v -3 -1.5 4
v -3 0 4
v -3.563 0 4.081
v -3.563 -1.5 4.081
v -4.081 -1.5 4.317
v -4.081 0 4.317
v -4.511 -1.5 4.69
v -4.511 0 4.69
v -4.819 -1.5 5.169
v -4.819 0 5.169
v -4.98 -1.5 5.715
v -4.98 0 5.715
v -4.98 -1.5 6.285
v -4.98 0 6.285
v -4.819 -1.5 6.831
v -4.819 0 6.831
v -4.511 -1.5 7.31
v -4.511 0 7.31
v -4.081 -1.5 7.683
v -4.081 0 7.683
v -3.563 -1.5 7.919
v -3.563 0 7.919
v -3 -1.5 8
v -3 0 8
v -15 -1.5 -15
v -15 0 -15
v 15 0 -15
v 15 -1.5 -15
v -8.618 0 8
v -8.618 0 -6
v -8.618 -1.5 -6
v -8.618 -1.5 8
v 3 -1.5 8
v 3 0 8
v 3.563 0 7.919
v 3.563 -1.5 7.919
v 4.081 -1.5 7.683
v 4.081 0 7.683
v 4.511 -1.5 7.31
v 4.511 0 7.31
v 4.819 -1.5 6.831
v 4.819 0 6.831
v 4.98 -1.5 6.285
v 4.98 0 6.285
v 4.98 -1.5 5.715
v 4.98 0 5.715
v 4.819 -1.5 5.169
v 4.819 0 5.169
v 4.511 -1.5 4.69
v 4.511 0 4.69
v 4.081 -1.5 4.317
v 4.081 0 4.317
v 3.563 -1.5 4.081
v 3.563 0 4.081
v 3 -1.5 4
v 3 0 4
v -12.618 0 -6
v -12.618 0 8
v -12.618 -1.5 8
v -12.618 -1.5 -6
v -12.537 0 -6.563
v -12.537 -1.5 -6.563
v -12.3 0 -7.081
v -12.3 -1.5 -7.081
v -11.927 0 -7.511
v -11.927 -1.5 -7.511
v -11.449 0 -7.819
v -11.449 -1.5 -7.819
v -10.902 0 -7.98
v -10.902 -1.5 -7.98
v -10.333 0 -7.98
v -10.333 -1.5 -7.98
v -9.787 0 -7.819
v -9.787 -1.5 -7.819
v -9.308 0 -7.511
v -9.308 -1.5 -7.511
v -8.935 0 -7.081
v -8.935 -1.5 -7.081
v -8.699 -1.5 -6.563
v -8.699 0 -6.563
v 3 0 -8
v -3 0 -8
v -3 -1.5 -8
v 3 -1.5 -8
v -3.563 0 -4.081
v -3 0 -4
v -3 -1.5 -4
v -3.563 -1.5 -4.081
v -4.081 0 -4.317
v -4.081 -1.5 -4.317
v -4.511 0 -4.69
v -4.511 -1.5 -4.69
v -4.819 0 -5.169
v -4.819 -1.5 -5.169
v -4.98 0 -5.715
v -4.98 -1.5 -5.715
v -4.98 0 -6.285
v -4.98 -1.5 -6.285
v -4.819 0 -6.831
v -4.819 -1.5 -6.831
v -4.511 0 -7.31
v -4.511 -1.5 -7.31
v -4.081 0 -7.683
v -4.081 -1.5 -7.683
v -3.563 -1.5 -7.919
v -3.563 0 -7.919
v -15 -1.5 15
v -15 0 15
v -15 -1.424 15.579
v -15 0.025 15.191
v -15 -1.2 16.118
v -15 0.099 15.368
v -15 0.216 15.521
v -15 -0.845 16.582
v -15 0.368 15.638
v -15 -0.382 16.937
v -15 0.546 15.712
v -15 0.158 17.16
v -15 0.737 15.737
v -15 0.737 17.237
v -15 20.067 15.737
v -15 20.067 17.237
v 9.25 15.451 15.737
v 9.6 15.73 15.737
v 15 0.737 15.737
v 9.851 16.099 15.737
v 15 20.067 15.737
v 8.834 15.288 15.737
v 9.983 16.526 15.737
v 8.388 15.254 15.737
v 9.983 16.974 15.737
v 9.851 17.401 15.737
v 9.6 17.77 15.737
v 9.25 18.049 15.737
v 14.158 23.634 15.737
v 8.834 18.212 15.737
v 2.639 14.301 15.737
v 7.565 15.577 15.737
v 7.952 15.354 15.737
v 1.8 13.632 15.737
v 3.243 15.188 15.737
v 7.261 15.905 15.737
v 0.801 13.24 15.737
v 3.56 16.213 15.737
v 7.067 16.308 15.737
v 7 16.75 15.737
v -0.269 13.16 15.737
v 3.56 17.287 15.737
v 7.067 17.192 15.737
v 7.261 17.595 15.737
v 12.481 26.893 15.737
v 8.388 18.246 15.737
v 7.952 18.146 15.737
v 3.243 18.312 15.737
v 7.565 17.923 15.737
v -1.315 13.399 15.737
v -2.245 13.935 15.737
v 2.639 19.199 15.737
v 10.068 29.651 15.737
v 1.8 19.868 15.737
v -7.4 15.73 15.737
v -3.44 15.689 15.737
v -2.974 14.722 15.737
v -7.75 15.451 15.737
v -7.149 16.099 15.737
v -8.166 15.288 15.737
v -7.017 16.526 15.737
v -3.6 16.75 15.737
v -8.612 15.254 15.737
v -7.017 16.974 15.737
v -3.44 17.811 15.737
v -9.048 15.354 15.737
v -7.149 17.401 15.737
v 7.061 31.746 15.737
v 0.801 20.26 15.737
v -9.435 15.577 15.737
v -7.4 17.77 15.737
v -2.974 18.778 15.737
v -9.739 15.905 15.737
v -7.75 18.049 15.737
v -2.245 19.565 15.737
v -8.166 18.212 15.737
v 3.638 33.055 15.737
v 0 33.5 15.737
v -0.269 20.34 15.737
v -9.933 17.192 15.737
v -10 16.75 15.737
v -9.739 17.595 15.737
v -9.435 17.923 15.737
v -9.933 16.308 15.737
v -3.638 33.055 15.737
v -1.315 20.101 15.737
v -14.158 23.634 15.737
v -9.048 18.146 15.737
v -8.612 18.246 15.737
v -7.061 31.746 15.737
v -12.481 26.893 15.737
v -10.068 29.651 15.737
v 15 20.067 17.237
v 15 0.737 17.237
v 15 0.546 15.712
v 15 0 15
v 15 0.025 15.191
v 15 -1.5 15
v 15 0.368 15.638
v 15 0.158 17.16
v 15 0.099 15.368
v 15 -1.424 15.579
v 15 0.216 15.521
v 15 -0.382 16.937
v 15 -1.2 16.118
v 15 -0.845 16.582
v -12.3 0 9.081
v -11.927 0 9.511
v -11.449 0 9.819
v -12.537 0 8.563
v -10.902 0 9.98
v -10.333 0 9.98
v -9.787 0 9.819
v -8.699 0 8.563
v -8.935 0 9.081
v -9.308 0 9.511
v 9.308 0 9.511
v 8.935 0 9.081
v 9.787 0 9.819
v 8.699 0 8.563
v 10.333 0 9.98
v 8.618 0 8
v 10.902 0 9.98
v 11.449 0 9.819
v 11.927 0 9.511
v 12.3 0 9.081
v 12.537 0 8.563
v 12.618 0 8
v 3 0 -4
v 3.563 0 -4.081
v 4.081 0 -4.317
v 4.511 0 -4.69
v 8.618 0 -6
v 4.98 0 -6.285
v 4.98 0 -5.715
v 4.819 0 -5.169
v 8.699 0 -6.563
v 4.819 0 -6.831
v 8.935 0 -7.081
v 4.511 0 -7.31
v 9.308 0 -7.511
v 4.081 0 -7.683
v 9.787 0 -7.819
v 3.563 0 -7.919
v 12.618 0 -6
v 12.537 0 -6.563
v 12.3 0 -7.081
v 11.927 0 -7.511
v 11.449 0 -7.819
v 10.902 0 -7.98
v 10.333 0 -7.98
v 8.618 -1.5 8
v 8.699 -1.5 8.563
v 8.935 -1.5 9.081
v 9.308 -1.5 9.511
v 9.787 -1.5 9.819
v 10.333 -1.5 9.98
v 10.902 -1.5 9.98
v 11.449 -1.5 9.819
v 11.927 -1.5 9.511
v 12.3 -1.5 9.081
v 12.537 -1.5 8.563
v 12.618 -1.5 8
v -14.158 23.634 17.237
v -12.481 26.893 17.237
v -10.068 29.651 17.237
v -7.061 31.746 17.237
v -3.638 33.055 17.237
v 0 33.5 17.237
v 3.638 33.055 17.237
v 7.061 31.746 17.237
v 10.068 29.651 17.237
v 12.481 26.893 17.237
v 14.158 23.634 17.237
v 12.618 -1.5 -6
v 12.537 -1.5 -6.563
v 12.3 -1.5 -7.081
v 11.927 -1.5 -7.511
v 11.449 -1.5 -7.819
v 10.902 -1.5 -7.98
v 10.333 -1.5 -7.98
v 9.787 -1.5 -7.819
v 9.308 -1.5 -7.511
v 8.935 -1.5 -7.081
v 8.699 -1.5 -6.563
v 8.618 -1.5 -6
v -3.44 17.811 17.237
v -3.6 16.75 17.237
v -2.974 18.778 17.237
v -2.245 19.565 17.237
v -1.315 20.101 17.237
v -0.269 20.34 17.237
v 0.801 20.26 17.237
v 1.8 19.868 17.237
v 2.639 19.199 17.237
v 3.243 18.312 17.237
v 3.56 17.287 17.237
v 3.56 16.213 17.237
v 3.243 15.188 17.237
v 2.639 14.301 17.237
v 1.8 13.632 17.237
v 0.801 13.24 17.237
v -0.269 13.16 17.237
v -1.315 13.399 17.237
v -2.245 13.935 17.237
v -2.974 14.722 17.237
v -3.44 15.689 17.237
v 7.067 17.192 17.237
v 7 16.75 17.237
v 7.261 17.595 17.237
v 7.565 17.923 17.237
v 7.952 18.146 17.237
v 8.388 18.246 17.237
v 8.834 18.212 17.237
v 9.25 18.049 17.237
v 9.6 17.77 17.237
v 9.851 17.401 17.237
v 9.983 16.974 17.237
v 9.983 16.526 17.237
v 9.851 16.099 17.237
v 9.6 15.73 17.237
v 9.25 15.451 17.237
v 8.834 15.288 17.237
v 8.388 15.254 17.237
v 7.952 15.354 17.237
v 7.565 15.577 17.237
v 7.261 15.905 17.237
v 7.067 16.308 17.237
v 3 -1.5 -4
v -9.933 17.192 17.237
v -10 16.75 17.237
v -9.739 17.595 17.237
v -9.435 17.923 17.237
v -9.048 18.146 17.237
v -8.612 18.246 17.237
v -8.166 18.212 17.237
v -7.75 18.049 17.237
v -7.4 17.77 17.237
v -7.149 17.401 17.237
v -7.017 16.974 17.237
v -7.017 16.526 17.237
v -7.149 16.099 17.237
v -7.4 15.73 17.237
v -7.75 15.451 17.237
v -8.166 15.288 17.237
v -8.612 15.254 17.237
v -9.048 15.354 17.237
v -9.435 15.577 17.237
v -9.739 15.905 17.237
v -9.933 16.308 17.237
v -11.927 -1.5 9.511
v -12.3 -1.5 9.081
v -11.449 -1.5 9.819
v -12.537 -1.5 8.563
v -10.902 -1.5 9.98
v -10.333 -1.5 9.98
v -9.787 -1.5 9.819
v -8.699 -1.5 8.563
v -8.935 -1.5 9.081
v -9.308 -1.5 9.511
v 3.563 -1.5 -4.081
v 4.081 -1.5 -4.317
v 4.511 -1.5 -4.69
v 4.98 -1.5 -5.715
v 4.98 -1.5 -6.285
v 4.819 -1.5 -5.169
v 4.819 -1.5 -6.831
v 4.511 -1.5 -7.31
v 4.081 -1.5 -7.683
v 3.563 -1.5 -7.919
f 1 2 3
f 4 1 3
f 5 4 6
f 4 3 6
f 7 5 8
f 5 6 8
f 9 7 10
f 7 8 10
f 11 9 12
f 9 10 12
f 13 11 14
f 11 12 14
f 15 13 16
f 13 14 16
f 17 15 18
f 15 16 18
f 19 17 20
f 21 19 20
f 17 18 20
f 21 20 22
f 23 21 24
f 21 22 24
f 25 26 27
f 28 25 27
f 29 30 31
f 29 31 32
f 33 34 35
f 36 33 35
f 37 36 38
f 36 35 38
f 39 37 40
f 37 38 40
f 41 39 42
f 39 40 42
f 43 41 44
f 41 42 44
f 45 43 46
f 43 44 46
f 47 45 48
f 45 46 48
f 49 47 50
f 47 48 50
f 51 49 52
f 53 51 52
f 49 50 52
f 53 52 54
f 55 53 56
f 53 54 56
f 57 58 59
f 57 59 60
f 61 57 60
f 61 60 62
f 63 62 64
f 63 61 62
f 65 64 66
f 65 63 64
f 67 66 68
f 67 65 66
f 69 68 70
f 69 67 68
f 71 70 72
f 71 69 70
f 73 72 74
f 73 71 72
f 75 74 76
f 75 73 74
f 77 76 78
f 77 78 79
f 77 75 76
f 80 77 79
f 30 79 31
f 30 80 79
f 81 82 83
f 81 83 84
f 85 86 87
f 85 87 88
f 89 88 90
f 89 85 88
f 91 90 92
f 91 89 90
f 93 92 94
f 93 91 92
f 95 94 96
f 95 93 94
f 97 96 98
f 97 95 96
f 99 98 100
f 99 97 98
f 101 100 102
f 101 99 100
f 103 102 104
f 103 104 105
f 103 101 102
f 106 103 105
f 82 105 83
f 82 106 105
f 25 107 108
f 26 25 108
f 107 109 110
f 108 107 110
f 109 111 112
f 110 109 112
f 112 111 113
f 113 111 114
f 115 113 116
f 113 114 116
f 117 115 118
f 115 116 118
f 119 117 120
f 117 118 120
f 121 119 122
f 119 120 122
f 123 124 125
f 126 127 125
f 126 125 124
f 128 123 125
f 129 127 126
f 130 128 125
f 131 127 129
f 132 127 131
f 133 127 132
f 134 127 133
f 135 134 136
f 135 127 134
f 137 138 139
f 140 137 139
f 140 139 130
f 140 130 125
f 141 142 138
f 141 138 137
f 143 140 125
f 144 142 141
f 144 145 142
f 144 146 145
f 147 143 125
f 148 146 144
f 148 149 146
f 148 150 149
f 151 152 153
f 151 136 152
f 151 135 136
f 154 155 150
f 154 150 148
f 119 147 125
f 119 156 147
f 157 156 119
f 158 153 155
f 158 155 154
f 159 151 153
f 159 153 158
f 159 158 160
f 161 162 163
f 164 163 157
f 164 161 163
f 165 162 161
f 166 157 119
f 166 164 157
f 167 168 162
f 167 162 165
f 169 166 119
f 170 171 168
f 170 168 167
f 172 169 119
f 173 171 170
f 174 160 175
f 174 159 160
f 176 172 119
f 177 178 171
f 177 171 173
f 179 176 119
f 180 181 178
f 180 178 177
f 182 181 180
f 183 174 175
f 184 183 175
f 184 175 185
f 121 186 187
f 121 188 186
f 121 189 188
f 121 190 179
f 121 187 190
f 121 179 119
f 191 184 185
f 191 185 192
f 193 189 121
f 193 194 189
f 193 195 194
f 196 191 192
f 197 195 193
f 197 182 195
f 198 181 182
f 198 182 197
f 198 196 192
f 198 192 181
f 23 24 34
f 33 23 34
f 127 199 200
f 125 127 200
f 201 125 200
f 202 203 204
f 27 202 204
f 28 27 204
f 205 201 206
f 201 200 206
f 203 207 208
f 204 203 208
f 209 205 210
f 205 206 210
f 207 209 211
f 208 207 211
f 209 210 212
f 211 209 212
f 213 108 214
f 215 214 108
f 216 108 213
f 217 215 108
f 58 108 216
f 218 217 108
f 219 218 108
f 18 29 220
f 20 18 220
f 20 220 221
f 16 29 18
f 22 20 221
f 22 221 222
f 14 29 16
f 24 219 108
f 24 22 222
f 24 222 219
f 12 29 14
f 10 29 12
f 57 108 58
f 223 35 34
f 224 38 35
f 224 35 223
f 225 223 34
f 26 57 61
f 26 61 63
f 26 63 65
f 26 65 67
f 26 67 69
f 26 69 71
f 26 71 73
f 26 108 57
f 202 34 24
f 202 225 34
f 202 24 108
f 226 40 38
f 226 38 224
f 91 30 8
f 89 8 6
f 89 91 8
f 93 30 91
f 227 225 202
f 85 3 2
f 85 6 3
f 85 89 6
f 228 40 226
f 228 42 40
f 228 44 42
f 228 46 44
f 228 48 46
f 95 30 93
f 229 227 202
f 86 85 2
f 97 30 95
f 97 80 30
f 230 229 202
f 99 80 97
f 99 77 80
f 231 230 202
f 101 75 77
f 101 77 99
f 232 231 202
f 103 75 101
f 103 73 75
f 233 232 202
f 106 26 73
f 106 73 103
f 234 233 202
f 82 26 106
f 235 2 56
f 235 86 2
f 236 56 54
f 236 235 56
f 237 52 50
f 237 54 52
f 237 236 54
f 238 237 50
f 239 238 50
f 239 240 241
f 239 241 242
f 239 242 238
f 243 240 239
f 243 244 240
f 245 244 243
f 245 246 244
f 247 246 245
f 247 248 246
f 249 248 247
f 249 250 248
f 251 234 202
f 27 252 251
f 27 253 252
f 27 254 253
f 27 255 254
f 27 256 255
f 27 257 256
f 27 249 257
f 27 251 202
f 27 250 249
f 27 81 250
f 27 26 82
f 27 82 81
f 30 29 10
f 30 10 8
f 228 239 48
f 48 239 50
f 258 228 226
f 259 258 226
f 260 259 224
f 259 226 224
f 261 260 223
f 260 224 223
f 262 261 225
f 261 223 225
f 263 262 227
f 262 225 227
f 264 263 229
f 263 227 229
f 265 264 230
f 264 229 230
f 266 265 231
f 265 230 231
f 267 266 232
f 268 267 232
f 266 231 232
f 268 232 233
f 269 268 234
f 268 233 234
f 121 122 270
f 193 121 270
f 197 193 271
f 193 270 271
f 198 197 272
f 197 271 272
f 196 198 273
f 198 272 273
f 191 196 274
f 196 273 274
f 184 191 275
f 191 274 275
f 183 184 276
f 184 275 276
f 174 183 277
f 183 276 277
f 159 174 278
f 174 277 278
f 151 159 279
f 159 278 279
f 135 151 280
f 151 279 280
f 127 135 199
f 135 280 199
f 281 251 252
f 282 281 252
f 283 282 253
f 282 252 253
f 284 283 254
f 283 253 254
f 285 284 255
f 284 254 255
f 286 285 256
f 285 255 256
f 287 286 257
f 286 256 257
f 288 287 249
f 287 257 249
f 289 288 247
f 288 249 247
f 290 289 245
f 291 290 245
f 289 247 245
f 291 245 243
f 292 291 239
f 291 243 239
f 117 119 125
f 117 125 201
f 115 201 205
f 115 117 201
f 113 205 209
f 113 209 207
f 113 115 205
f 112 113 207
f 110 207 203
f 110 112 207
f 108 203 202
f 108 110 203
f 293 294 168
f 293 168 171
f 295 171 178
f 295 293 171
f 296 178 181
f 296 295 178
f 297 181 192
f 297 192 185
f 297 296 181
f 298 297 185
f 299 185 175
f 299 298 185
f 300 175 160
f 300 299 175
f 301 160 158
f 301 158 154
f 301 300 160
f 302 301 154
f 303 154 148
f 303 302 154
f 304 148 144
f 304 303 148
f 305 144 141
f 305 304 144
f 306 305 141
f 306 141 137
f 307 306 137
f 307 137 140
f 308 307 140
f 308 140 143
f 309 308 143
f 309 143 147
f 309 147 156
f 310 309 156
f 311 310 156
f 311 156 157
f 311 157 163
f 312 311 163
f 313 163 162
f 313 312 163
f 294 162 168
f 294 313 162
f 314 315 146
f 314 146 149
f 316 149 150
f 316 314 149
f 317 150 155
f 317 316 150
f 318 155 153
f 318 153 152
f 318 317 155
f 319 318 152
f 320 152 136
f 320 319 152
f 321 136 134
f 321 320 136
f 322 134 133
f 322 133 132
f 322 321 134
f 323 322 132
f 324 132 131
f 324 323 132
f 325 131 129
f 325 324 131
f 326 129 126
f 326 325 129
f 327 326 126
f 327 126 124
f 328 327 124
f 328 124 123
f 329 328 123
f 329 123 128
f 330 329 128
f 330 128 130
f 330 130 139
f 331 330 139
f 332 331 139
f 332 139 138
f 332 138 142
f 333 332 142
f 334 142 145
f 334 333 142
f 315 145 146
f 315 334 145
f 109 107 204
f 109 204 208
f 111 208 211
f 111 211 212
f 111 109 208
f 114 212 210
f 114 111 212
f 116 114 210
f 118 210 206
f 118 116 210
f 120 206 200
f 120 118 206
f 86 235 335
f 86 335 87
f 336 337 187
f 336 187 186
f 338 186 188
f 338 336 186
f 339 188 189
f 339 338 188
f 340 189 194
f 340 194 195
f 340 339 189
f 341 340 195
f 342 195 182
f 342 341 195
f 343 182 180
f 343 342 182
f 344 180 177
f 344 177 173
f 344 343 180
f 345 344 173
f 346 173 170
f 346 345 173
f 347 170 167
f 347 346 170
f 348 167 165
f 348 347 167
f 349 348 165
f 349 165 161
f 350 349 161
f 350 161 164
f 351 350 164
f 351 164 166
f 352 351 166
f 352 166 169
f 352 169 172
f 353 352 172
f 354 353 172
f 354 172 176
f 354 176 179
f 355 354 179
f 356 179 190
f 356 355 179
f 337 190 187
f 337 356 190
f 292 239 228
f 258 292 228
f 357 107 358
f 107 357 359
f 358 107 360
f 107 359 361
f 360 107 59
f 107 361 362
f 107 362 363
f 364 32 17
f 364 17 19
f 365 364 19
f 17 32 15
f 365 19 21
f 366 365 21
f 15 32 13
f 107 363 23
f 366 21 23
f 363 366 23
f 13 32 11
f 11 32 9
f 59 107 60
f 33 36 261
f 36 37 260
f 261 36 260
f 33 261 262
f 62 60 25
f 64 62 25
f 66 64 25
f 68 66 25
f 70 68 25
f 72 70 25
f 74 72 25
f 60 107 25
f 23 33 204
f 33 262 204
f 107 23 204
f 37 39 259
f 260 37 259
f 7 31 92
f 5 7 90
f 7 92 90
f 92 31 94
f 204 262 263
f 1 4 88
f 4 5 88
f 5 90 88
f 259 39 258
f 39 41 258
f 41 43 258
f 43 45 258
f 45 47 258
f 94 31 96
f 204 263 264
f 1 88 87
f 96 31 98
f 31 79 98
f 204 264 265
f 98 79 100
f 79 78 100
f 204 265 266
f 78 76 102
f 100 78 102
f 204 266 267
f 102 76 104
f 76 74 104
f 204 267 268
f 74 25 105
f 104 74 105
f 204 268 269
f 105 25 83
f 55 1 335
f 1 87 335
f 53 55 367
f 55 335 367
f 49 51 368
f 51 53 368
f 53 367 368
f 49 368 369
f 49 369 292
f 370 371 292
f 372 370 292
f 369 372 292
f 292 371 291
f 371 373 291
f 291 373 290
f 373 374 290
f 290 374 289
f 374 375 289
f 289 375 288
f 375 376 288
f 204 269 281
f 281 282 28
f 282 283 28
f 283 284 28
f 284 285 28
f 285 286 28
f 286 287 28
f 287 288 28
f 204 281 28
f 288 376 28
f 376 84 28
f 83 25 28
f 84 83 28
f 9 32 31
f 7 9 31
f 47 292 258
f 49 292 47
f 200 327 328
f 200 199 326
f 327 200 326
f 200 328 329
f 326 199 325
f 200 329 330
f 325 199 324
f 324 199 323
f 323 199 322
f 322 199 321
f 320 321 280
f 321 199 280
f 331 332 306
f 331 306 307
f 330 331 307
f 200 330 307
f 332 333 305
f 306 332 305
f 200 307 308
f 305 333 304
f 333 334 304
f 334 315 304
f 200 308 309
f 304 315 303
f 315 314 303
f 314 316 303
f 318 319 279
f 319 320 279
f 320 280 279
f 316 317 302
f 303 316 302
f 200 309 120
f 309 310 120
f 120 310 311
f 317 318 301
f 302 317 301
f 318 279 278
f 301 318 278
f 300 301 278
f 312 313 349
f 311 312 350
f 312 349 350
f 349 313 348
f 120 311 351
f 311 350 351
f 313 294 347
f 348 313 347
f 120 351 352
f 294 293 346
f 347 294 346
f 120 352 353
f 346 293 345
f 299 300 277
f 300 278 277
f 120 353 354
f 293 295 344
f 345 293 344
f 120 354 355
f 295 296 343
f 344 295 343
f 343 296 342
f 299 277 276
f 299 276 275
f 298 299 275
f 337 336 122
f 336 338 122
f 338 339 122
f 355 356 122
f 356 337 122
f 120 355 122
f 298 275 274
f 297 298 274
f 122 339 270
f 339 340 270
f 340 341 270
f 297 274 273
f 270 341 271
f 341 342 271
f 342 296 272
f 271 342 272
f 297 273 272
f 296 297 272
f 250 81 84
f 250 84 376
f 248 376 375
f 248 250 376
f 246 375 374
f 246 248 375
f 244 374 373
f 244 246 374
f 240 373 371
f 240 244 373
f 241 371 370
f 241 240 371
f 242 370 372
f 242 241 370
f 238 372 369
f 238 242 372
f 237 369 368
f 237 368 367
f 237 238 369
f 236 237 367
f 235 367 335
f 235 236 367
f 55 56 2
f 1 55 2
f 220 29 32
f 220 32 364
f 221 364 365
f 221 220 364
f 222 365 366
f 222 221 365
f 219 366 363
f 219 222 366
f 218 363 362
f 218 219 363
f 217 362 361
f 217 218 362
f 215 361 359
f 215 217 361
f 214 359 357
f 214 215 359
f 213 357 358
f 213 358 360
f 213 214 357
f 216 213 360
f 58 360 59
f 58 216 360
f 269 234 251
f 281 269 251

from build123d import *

# Parameters (mm, degrees)
SKETCH1_W                = 30
SKETCH1_H                = 30
BASE_FLANGE1_DEPTH       = 1.5
EDGE_FLANGE1_DEPTH       = 30
EDGE_FLANGE1_START       = -1.5
EDGE_FLANGE1_PROFILE_R   = 1.5
EDGE_FLANGE1_PROFILE_R_2 = 3.6
EDGE_FLANGE1_FLAT_DEPTH  = 1.5


# Sheet-metal steps are written as plain solids
with BuildPart() as part:
    # Sketch1 → Base-Flange1 (new body)
    with BuildSketch(Plane(origin=(0, 0, 0), x_dir=(1, 0, 0), z_dir=(0, 1, 0))):
        Rectangle(SKETCH1_W, SKETCH1_H)
        with BuildLine():
            Line((-8.617716364, 6), (-8.617716364, -8))
            ThreePointArc((-8.617716364, -8), (-10.617716364, -10), (-12.617716364, -8))
            Line((-12.617716364, -8), (-12.617716364, 6))
            ThreePointArc((-12.617716364, 6), (-10.617716364, 8), (-8.617716364, 6))
        make_face(mode=Mode.SUBTRACT)
        with BuildLine():
            Line((8.617716364, 6), (8.617716364, -8))
            ThreePointArc((8.617716364, -8), (10.617716364, -10), (12.617716364, -8))
            Line((12.617716364, -8), (12.617716364, 6))
            ThreePointArc((12.617716364, 6), (10.617716364, 8), (8.617716364, 6))
        make_face(mode=Mode.SUBTRACT)
        with BuildLine():
            Line((-3, 8), (3, 8))
            ThreePointArc((3, 8), (5, 6), (3, 4))
            Line((3, 4), (-3, 4))
            ThreePointArc((-3, 4), (-5, 6), (-3, 8))
        make_face(mode=Mode.SUBTRACT)
        with BuildLine():
            Line((-3, -8), (3, -8))
            ThreePointArc((3, -8), (5, -6), (3, -4))
            Line((3, -4), (-3, -4))
            ThreePointArc((-3, -4), (-5, -6), (-3, -8))
        make_face(mode=Mode.SUBTRACT)
    extrude(amount=-BASE_FLANGE1_DEPTH)

    # Edge-Flange1 bend section (across the edge) → Edge-Flange1 (add)
    with BuildSketch(Plane(origin=(-15, 0, 15.7366), x_dir=(0, 0, -1), z_dir=(1, 0, 0))):
        with BuildLine():
            Line((-1.5, 0.7366), (0, 0.7366))
            ThreePointArc((0, 0.7366), (0.215745145, 0.215745145), (0.7366, 0))
            Line((0.7366, 0), (0.7366, -1.5))
            ThreePointArc((0.7366, -1.5), (-0.844915027, -0.844915027), (-1.5, 0.7366))
        make_face()
    extrude(amount=EDGE_FLANGE1_DEPTH)

    # Edge-Flange1 profile (on flange) → Edge-Flange1 flat (add)
    with BuildSketch(Plane(origin=(0, 0, 15.7366), x_dir=(-1, 0, 0), z_dir=(0, 0, -1)).offset(EDGE_FLANGE1_START)):
        with BuildLine():
            ThreePointArc((15, 20.067164179), (0, 33.5), (-15, 20.067164179))
            Line((-15, 20.067164179), (-15, 0.7366))
            Line((-15, 0.7366), (15, 0.7366))
            Line((15, 0.7366), (15, 20.067164179))
        make_face()
        with Locations((8.5, 16.75)):
            Circle(EDGE_FLANGE1_PROFILE_R, mode=Mode.SUBTRACT)
        with Locations((0, 16.75)):
            Circle(EDGE_FLANGE1_PROFILE_R_2, mode=Mode.SUBTRACT)
        with Locations((-8.5, 16.75)):
            Circle(EDGE_FLANGE1_PROFILE_R, mode=Mode.SUBTRACT)
    extrude(amount=EDGE_FLANGE1_FLAT_DEPTH)


solid = part.part
